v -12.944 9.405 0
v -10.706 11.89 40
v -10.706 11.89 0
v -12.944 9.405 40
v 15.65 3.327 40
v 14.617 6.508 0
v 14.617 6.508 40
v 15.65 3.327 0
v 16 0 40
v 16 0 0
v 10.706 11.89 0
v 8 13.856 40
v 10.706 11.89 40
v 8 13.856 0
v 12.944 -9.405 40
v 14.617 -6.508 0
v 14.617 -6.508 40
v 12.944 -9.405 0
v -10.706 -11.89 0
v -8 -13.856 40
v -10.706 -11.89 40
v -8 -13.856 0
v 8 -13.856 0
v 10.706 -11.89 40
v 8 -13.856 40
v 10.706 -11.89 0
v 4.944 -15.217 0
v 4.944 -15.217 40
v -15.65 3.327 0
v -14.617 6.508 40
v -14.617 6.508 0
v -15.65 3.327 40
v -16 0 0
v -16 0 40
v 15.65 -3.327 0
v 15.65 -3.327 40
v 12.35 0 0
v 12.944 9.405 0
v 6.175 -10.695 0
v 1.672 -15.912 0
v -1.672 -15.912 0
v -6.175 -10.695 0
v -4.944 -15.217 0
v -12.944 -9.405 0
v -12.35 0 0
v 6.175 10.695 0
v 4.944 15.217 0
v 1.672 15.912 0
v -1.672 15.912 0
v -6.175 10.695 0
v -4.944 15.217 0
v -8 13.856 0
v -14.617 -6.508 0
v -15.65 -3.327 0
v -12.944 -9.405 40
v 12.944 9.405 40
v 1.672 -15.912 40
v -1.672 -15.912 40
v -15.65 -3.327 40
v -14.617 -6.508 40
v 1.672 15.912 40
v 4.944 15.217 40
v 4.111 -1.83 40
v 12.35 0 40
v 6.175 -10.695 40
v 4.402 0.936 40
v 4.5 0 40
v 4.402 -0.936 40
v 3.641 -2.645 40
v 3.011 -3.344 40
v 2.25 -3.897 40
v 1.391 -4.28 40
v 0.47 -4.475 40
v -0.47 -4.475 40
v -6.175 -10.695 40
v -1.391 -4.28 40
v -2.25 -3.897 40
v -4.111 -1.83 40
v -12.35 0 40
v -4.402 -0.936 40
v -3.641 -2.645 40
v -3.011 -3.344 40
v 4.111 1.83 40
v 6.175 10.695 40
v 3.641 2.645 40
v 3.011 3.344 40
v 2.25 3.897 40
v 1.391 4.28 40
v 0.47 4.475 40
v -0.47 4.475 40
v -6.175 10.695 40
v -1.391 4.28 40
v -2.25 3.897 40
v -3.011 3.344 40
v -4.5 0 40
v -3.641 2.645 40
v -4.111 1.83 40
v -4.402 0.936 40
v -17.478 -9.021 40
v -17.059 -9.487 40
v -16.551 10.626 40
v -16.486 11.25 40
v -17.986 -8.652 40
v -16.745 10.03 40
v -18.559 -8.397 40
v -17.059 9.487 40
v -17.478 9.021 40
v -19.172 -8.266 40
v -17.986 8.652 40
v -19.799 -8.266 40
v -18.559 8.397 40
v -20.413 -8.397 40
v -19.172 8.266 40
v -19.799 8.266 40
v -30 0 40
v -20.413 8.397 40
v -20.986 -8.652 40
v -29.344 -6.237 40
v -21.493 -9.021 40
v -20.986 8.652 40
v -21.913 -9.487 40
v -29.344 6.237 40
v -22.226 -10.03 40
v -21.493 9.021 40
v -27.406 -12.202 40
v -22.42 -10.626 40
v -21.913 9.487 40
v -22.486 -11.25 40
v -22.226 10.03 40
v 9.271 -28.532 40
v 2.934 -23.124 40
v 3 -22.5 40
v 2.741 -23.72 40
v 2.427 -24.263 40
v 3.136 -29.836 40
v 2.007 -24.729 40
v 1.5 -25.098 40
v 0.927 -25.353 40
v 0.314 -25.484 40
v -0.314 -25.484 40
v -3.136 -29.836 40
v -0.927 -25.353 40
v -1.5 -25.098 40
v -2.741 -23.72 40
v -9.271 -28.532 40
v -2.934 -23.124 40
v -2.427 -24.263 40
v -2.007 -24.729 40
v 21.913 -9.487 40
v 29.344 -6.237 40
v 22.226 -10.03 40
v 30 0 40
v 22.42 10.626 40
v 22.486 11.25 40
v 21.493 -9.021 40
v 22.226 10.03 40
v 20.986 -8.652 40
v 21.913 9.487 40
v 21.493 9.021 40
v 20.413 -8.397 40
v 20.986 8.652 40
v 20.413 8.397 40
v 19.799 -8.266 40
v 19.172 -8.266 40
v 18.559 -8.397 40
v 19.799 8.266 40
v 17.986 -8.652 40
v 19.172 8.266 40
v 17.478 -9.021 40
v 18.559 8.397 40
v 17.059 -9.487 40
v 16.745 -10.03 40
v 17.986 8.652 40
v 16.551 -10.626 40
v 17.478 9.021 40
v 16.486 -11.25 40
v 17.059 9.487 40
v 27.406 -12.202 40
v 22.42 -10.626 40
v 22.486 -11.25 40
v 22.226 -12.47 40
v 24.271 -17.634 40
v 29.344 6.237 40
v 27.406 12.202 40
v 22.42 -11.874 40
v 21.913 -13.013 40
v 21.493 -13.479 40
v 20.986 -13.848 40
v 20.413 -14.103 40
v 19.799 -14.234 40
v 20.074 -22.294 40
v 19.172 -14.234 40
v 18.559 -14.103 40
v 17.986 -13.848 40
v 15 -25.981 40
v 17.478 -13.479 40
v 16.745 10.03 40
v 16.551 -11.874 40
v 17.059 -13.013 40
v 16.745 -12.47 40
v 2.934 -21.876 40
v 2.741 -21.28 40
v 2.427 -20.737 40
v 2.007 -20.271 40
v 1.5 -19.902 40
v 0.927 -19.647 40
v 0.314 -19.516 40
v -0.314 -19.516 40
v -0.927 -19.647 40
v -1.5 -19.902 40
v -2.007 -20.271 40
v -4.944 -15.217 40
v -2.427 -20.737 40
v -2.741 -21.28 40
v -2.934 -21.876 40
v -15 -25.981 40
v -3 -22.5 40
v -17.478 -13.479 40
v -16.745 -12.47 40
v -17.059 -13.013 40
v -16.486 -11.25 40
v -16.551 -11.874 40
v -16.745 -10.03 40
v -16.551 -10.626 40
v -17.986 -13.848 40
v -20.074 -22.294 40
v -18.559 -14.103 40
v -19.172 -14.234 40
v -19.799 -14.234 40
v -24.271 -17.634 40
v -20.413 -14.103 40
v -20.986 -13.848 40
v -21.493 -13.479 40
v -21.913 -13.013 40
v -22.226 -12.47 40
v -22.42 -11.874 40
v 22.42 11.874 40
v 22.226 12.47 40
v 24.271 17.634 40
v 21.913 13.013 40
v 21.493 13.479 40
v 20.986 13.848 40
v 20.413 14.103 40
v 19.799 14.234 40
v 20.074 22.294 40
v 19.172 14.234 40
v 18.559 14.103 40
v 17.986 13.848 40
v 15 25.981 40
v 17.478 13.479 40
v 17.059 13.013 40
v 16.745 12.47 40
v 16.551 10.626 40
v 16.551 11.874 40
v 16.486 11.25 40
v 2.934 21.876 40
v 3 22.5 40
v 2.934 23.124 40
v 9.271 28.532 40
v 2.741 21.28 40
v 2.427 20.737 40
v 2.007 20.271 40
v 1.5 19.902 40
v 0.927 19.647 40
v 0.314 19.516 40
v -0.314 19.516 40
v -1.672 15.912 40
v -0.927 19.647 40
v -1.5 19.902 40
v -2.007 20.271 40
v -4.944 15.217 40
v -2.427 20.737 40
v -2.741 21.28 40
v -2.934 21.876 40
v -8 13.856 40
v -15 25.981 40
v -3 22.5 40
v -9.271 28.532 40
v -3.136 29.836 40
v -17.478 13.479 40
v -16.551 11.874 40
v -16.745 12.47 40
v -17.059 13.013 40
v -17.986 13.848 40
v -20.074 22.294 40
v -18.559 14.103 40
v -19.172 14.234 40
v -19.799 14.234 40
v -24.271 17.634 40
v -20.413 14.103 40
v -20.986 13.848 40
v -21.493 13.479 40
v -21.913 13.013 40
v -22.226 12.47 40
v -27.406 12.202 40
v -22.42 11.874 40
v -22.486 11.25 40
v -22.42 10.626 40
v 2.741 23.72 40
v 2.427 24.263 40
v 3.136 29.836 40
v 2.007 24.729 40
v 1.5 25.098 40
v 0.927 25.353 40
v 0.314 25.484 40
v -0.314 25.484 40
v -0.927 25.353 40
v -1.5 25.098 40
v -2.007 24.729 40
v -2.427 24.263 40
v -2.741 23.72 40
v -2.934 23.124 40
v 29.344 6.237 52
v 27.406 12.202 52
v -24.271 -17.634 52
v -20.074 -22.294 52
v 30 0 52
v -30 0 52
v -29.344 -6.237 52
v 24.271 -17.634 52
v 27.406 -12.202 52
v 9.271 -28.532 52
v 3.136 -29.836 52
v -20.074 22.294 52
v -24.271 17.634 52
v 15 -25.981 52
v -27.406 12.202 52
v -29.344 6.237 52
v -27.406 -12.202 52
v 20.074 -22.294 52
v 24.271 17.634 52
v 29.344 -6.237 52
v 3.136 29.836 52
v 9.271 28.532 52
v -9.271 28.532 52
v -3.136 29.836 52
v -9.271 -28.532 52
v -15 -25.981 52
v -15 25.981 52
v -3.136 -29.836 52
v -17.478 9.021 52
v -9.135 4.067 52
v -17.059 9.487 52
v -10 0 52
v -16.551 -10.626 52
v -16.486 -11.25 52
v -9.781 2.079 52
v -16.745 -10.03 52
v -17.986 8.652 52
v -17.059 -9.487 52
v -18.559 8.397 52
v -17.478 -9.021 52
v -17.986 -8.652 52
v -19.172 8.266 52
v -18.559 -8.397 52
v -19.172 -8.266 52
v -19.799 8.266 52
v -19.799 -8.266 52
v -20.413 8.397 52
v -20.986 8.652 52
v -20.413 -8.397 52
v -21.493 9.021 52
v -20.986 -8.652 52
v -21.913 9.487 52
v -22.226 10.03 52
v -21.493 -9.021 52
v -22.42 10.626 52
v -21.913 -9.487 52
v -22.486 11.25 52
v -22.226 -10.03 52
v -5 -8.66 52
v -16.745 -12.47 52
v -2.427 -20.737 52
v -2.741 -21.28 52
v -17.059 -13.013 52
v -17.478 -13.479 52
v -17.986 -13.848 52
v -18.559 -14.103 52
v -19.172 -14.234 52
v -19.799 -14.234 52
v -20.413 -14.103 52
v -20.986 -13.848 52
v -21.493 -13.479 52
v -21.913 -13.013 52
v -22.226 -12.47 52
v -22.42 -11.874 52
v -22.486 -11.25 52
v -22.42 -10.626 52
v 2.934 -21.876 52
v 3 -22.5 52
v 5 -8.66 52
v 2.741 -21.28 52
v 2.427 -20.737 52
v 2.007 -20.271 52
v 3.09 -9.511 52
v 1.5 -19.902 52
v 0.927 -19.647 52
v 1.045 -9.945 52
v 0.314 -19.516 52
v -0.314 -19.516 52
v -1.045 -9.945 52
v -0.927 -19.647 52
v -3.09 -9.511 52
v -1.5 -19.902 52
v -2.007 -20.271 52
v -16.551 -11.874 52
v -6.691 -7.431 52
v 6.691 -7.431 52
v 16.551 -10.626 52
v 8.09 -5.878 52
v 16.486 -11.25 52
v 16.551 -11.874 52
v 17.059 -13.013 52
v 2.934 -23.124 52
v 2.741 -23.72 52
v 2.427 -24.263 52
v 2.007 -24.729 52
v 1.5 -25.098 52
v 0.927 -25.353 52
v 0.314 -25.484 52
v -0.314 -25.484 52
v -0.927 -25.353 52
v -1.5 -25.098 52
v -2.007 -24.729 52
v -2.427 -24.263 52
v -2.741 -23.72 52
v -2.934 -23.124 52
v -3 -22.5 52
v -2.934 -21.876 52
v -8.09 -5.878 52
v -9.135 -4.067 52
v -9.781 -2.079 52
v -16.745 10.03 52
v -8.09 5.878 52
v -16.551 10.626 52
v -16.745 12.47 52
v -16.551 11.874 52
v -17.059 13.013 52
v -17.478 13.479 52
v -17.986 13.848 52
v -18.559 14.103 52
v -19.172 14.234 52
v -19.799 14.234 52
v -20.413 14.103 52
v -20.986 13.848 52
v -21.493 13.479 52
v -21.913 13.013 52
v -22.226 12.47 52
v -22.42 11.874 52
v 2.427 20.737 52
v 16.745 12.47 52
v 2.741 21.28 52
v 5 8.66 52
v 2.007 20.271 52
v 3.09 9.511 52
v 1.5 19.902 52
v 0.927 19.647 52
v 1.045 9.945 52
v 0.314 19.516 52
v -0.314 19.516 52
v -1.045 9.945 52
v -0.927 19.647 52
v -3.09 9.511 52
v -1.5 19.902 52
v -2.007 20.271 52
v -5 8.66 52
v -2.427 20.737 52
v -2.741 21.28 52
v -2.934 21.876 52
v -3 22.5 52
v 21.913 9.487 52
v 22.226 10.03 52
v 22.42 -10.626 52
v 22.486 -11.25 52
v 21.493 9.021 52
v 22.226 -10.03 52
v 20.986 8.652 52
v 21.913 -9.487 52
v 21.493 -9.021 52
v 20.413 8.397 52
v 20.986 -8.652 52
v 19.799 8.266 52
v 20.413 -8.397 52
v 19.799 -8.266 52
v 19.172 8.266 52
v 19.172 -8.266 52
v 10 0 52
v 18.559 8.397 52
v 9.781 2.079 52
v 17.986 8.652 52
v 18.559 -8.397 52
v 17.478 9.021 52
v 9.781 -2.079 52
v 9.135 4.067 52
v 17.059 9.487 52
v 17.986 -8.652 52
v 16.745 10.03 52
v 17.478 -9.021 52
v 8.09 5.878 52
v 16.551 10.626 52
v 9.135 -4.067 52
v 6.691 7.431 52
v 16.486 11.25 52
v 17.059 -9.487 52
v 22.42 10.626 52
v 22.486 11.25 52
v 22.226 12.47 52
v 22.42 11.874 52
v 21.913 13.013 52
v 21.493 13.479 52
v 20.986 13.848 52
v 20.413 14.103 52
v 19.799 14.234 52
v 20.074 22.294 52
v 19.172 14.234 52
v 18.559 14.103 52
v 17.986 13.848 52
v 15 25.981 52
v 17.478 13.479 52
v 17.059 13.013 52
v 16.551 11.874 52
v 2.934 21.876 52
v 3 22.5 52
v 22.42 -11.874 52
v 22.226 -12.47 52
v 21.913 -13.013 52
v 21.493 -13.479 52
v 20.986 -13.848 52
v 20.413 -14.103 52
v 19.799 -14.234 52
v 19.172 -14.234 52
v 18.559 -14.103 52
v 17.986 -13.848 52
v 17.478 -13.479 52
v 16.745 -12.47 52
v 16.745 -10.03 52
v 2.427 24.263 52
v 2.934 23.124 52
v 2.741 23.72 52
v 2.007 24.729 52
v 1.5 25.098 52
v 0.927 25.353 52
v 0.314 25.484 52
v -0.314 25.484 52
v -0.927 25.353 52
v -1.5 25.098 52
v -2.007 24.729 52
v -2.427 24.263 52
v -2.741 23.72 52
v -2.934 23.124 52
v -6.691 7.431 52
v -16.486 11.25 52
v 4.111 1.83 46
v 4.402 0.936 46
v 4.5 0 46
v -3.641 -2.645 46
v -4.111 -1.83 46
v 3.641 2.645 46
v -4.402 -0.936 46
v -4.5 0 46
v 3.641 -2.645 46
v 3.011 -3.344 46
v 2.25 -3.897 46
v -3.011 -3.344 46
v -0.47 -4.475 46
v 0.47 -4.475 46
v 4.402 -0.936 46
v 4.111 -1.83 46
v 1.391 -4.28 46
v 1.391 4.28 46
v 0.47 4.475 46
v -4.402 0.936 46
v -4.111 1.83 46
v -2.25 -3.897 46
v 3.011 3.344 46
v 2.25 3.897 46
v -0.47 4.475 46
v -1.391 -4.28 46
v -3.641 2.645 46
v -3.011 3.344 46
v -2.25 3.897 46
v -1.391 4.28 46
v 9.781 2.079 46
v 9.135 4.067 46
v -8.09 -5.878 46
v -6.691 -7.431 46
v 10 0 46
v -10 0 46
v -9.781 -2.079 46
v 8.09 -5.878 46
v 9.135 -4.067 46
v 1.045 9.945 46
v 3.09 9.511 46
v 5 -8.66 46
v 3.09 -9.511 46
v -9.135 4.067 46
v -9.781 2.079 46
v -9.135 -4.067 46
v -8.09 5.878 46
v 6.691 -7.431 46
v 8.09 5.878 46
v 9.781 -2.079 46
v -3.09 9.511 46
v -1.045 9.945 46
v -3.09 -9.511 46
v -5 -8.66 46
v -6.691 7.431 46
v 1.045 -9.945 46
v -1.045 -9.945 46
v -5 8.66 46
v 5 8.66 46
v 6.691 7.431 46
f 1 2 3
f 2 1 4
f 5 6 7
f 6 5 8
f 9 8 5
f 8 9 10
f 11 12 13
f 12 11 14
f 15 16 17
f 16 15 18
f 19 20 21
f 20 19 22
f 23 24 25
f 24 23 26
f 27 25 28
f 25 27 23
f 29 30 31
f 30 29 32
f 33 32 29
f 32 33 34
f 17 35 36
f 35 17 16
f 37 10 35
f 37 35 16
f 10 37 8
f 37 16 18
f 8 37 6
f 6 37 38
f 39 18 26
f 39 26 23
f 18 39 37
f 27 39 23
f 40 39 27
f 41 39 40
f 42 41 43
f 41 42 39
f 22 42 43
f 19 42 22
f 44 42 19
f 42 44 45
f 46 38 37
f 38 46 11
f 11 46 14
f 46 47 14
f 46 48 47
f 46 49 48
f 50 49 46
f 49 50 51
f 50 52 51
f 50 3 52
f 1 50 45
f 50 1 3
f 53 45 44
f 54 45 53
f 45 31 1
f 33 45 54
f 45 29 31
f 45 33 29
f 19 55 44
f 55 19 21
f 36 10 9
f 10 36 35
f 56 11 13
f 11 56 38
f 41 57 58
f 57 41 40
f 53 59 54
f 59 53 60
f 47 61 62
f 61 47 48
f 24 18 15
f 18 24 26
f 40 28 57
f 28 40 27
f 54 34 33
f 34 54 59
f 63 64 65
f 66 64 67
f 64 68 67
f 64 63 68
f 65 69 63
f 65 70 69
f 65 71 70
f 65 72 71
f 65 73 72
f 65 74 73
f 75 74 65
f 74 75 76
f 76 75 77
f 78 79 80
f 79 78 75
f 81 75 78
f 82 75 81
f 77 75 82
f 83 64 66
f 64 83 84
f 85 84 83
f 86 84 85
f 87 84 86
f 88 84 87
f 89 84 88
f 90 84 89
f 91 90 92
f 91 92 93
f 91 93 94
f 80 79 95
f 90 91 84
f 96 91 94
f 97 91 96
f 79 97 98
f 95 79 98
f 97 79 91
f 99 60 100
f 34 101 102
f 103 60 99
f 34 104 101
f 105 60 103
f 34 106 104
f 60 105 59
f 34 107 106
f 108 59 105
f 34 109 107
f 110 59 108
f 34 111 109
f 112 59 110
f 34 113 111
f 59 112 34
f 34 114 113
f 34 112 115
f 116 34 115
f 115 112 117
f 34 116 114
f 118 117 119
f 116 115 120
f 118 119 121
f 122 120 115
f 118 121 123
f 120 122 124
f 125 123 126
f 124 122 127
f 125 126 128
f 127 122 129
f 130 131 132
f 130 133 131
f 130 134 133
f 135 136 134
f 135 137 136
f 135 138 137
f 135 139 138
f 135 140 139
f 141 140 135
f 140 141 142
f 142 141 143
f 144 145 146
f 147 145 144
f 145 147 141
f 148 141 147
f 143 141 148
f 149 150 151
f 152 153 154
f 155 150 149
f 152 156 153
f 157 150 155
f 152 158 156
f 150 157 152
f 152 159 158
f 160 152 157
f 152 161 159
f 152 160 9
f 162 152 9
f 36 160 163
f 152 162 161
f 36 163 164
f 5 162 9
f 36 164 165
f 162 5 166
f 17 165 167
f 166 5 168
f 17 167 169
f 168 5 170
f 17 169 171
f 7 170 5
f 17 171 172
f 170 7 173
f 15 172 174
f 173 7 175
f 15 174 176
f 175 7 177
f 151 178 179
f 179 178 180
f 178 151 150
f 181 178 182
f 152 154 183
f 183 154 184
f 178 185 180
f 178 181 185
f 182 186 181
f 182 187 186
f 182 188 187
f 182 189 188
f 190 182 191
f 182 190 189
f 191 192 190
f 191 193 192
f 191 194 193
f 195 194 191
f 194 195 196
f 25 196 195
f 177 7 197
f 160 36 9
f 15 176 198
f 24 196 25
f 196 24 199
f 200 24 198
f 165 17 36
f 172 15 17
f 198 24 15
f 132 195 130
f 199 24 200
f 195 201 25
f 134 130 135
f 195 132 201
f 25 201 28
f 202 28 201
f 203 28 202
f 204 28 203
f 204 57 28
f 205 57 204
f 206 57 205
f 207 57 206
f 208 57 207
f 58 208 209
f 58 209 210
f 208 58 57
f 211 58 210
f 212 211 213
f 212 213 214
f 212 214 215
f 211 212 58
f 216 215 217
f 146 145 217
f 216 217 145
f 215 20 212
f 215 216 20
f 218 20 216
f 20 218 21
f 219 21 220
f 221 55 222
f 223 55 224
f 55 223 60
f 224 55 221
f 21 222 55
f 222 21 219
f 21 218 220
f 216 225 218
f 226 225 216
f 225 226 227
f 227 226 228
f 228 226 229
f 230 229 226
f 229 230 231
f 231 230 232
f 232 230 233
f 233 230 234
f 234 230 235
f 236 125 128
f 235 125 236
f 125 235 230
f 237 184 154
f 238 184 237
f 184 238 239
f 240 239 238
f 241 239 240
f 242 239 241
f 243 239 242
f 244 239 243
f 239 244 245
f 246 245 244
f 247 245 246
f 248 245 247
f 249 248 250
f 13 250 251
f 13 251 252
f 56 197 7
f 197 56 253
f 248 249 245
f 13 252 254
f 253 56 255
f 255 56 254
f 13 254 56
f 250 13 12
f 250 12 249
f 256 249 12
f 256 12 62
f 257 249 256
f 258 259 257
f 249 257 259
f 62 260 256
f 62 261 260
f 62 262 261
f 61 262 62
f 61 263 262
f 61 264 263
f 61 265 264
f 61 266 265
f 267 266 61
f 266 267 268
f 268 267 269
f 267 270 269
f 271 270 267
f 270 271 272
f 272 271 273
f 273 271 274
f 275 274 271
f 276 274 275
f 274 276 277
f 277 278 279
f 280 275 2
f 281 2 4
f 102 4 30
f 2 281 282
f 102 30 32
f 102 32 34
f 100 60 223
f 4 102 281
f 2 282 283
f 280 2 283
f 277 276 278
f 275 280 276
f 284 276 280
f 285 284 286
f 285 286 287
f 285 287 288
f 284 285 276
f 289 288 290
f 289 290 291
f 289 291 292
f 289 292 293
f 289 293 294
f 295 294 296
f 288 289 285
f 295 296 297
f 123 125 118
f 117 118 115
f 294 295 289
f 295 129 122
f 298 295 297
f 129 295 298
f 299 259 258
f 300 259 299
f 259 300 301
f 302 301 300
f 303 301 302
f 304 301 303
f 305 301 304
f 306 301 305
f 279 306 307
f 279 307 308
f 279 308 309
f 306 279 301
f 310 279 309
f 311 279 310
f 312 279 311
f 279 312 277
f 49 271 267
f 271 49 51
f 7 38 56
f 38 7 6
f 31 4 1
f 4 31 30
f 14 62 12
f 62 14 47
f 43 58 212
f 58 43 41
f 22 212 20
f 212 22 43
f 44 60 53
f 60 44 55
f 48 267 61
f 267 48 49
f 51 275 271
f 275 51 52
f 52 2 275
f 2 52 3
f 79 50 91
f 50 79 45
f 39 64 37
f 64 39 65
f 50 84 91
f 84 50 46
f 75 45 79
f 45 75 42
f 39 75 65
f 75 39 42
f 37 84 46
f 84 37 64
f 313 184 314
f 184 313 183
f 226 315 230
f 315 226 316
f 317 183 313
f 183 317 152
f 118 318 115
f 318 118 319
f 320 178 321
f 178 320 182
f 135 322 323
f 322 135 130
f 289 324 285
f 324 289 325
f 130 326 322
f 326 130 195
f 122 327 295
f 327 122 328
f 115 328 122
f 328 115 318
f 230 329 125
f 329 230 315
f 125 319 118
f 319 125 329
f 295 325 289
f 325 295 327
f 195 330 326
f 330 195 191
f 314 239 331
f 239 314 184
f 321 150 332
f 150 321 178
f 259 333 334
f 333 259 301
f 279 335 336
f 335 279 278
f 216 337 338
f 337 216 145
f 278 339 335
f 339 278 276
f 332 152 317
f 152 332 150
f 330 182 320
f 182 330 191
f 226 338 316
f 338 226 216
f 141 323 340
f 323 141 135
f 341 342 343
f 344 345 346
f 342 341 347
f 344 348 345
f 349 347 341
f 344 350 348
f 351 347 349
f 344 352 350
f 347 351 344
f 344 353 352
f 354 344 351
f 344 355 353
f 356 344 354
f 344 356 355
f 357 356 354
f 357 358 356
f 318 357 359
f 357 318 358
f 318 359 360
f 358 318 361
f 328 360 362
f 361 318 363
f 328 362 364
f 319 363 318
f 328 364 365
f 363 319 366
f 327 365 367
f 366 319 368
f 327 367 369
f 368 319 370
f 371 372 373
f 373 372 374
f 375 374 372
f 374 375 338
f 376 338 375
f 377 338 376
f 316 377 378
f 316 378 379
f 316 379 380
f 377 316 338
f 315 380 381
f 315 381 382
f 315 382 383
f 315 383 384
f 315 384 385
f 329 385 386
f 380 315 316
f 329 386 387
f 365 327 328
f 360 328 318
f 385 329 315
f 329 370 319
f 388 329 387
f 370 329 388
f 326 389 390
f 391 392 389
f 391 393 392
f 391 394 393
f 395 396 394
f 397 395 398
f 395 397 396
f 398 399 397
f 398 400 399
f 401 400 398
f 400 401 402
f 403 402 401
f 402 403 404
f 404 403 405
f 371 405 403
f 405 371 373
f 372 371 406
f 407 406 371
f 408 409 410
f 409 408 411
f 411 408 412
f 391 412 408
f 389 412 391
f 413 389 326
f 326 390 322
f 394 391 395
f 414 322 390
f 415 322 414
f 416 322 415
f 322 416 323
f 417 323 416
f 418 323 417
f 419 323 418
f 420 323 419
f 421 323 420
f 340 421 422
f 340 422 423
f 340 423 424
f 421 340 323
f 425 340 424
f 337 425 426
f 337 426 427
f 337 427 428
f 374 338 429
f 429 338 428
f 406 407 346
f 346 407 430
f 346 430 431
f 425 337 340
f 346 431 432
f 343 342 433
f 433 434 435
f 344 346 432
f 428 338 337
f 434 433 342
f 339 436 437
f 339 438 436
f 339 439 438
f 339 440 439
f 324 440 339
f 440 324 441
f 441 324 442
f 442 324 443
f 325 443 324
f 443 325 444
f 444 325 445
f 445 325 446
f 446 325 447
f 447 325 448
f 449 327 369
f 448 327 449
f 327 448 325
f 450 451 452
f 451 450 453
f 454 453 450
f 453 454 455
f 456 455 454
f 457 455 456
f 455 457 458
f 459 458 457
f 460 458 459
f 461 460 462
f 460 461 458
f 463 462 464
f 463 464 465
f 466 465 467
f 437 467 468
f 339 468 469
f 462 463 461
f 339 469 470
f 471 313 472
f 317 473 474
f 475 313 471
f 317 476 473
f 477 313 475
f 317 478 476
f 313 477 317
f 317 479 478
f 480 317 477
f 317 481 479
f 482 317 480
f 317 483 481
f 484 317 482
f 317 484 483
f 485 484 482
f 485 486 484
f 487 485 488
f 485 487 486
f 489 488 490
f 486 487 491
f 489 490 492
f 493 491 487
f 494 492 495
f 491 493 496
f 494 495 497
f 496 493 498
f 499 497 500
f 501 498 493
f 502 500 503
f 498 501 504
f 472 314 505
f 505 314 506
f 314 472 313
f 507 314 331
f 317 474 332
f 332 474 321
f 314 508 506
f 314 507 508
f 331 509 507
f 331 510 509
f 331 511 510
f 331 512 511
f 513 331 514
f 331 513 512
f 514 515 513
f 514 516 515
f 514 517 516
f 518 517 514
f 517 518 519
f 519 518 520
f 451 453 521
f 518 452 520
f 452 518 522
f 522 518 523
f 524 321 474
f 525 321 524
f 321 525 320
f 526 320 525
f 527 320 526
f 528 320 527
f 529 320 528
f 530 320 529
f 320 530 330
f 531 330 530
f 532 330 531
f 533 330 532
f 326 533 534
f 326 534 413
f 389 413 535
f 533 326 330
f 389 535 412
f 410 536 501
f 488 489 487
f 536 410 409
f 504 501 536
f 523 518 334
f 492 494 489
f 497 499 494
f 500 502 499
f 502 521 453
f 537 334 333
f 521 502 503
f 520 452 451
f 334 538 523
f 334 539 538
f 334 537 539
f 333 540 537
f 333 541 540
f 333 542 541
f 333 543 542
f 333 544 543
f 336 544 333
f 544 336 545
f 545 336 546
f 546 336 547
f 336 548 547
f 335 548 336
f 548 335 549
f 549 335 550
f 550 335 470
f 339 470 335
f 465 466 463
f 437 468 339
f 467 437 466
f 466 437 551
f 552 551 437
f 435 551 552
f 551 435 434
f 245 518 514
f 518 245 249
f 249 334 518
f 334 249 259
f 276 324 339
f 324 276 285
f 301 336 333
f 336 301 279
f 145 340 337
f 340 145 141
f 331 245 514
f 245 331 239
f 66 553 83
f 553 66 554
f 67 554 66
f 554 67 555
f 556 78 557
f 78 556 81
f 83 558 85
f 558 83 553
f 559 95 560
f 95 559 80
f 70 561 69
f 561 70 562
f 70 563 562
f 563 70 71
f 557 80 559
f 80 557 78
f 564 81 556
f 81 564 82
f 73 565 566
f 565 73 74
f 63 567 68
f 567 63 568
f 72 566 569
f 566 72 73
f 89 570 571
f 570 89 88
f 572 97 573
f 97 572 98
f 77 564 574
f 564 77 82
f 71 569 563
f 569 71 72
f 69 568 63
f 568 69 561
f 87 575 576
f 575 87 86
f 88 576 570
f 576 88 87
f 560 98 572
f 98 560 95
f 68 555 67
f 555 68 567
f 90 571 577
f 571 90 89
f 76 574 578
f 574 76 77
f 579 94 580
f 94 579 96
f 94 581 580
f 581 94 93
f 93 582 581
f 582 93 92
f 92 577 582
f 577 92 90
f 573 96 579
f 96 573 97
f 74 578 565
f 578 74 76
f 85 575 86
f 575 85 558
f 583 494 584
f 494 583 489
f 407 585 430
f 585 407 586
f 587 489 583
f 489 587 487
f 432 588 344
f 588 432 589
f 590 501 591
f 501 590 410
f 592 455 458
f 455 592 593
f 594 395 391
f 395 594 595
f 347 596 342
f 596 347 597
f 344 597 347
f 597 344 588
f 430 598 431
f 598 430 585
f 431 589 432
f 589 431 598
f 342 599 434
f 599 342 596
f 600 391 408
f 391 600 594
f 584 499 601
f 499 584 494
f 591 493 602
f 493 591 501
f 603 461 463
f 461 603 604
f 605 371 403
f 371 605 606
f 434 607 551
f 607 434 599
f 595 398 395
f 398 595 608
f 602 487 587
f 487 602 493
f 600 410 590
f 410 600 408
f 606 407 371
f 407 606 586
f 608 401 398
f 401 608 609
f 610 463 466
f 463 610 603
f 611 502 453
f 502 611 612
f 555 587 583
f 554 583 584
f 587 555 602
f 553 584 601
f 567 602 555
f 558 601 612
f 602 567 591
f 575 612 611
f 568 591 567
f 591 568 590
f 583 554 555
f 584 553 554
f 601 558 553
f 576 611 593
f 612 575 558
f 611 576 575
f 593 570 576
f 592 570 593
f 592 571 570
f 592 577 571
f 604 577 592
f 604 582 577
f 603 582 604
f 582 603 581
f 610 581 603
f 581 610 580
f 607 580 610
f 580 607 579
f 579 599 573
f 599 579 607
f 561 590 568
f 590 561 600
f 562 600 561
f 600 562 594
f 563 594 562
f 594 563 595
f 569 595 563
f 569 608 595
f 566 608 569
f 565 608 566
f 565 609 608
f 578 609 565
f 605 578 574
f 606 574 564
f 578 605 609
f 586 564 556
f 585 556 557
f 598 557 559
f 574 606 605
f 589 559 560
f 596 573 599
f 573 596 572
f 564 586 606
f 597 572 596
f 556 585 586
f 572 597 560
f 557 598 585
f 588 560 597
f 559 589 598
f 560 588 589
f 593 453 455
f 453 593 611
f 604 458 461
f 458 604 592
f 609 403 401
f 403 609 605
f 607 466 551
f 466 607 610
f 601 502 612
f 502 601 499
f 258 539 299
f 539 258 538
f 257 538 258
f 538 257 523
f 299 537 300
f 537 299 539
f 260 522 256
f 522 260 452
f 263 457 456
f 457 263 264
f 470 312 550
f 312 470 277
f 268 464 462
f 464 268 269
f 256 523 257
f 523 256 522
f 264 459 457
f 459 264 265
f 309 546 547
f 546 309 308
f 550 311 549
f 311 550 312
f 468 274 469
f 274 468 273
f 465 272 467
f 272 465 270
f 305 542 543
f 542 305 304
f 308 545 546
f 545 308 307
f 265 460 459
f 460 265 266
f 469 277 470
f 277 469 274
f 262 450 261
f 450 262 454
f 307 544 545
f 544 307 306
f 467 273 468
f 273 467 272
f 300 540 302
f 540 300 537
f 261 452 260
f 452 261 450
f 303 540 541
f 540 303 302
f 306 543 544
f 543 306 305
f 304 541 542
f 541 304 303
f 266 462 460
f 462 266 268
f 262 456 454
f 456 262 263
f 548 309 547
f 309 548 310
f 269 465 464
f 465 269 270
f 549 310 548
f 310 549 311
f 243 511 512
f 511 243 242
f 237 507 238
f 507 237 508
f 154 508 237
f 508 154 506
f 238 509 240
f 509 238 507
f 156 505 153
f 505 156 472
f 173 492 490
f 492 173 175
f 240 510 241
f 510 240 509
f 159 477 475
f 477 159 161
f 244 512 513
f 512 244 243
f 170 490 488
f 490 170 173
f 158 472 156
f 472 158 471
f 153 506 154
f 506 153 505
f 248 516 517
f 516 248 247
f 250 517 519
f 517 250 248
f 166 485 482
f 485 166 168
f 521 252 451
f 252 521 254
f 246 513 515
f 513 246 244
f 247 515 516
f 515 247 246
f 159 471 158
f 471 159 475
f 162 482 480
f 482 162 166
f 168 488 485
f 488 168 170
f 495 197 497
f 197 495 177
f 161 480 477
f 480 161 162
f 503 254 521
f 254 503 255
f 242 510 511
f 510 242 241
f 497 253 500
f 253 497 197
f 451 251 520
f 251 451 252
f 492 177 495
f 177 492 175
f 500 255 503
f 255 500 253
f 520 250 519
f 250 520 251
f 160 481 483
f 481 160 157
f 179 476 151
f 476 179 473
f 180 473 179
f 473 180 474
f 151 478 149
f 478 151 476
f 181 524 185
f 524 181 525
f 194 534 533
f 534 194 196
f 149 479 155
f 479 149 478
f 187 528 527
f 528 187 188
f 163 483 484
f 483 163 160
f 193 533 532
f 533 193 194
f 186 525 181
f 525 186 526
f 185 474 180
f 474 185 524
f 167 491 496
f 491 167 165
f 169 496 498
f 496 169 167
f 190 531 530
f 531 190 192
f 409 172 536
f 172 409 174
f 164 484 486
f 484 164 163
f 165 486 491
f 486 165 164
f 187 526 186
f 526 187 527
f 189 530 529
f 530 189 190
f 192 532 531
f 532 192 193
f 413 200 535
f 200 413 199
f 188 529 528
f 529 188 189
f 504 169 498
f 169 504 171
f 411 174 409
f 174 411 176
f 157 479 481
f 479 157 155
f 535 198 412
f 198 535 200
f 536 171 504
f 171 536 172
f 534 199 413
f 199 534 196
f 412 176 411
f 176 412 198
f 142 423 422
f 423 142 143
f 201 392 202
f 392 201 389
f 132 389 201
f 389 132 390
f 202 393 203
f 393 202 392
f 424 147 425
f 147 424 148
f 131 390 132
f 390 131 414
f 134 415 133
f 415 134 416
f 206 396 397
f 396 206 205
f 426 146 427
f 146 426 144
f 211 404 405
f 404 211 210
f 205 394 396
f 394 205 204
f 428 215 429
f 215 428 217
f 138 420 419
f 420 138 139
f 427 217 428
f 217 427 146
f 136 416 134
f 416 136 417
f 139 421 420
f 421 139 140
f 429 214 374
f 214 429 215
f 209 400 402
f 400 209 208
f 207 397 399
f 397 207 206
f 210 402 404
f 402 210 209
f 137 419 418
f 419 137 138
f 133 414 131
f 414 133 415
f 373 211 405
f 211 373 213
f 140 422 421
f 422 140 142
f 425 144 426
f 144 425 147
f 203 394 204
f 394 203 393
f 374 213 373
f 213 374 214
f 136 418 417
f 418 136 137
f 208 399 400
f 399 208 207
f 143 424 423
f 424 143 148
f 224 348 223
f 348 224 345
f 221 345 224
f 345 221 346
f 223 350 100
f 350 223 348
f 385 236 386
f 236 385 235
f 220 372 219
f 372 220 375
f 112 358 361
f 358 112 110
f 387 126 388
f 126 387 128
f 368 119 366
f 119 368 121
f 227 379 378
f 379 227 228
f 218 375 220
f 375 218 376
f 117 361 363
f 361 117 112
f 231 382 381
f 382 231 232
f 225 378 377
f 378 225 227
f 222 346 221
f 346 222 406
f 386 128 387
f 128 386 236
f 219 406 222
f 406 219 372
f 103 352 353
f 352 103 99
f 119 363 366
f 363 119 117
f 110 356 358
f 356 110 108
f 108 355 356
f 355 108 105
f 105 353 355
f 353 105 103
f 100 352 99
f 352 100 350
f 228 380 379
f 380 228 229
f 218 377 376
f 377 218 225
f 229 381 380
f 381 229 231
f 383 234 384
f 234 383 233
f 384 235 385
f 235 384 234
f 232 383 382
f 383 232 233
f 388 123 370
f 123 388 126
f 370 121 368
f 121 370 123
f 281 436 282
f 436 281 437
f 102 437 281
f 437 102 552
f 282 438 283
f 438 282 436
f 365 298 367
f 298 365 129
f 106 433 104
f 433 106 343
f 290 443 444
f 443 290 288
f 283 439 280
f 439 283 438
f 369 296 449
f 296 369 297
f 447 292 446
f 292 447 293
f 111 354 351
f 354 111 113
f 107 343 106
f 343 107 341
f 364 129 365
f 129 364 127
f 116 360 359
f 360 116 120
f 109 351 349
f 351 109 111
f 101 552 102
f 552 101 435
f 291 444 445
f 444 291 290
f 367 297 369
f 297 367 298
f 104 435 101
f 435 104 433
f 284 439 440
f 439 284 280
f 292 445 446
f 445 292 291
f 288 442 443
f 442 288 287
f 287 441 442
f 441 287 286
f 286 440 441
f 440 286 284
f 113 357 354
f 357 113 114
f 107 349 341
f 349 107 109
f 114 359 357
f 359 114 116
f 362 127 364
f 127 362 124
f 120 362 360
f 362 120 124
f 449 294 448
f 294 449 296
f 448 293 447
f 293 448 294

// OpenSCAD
fn = 30;



difference() {

    union() {

        difference () {
            linear_extrude(40) circle(d=32, $fn=fn);
            linear_extrude(40) circle(d=24.7, $fn=6);
        }
        
        translate([0,0,40]) difference() {
            linear_extrude(12) circle(d=60, $fn=fn);
            linear_extrude(12) circle(d=9, $fn=fn);
            translate([0,0,6]) linear_extrude(6) circle(d=20, $fn=fn);
        }
    }
    
    hs = 45/2;
    #translate([0,0,40]) for (i = [0:5]) {
        echo(360*i/6, sin(360*i/6)*hs, cos(360*i/6)*hs);
        translate([sin(360*i/6)*hs, cos(360*i/6)*hs, 0 ])
        cylinder(h = 12, d=6, $fn=fn);
    }
    
}
